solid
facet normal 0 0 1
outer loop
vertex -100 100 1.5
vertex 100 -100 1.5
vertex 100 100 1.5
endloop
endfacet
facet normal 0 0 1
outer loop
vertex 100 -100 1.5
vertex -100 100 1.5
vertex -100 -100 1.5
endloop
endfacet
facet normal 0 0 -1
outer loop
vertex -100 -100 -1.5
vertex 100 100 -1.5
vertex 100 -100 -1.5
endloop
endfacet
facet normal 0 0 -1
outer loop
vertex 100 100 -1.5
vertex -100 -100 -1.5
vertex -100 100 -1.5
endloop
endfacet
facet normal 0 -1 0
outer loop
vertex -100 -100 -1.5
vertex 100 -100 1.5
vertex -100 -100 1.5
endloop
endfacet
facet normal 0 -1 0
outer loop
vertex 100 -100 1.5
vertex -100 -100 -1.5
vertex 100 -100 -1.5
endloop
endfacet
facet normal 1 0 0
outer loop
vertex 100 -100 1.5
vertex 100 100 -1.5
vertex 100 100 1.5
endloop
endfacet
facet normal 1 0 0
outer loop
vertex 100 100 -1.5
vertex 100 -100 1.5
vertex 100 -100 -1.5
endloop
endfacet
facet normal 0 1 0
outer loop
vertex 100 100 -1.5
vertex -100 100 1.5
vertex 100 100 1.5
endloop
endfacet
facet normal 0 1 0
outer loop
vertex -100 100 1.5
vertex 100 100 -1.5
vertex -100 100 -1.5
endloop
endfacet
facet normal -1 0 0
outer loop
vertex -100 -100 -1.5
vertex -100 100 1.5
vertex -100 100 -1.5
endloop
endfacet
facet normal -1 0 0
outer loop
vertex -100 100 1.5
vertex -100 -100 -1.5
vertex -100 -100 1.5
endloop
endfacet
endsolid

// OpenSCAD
$fn=64;

module sheet_acrylic(length=200, width=200, thickness=3, center=true) {
    cube([length, width, thickness], center=center);
}

sheet_acrylic();
